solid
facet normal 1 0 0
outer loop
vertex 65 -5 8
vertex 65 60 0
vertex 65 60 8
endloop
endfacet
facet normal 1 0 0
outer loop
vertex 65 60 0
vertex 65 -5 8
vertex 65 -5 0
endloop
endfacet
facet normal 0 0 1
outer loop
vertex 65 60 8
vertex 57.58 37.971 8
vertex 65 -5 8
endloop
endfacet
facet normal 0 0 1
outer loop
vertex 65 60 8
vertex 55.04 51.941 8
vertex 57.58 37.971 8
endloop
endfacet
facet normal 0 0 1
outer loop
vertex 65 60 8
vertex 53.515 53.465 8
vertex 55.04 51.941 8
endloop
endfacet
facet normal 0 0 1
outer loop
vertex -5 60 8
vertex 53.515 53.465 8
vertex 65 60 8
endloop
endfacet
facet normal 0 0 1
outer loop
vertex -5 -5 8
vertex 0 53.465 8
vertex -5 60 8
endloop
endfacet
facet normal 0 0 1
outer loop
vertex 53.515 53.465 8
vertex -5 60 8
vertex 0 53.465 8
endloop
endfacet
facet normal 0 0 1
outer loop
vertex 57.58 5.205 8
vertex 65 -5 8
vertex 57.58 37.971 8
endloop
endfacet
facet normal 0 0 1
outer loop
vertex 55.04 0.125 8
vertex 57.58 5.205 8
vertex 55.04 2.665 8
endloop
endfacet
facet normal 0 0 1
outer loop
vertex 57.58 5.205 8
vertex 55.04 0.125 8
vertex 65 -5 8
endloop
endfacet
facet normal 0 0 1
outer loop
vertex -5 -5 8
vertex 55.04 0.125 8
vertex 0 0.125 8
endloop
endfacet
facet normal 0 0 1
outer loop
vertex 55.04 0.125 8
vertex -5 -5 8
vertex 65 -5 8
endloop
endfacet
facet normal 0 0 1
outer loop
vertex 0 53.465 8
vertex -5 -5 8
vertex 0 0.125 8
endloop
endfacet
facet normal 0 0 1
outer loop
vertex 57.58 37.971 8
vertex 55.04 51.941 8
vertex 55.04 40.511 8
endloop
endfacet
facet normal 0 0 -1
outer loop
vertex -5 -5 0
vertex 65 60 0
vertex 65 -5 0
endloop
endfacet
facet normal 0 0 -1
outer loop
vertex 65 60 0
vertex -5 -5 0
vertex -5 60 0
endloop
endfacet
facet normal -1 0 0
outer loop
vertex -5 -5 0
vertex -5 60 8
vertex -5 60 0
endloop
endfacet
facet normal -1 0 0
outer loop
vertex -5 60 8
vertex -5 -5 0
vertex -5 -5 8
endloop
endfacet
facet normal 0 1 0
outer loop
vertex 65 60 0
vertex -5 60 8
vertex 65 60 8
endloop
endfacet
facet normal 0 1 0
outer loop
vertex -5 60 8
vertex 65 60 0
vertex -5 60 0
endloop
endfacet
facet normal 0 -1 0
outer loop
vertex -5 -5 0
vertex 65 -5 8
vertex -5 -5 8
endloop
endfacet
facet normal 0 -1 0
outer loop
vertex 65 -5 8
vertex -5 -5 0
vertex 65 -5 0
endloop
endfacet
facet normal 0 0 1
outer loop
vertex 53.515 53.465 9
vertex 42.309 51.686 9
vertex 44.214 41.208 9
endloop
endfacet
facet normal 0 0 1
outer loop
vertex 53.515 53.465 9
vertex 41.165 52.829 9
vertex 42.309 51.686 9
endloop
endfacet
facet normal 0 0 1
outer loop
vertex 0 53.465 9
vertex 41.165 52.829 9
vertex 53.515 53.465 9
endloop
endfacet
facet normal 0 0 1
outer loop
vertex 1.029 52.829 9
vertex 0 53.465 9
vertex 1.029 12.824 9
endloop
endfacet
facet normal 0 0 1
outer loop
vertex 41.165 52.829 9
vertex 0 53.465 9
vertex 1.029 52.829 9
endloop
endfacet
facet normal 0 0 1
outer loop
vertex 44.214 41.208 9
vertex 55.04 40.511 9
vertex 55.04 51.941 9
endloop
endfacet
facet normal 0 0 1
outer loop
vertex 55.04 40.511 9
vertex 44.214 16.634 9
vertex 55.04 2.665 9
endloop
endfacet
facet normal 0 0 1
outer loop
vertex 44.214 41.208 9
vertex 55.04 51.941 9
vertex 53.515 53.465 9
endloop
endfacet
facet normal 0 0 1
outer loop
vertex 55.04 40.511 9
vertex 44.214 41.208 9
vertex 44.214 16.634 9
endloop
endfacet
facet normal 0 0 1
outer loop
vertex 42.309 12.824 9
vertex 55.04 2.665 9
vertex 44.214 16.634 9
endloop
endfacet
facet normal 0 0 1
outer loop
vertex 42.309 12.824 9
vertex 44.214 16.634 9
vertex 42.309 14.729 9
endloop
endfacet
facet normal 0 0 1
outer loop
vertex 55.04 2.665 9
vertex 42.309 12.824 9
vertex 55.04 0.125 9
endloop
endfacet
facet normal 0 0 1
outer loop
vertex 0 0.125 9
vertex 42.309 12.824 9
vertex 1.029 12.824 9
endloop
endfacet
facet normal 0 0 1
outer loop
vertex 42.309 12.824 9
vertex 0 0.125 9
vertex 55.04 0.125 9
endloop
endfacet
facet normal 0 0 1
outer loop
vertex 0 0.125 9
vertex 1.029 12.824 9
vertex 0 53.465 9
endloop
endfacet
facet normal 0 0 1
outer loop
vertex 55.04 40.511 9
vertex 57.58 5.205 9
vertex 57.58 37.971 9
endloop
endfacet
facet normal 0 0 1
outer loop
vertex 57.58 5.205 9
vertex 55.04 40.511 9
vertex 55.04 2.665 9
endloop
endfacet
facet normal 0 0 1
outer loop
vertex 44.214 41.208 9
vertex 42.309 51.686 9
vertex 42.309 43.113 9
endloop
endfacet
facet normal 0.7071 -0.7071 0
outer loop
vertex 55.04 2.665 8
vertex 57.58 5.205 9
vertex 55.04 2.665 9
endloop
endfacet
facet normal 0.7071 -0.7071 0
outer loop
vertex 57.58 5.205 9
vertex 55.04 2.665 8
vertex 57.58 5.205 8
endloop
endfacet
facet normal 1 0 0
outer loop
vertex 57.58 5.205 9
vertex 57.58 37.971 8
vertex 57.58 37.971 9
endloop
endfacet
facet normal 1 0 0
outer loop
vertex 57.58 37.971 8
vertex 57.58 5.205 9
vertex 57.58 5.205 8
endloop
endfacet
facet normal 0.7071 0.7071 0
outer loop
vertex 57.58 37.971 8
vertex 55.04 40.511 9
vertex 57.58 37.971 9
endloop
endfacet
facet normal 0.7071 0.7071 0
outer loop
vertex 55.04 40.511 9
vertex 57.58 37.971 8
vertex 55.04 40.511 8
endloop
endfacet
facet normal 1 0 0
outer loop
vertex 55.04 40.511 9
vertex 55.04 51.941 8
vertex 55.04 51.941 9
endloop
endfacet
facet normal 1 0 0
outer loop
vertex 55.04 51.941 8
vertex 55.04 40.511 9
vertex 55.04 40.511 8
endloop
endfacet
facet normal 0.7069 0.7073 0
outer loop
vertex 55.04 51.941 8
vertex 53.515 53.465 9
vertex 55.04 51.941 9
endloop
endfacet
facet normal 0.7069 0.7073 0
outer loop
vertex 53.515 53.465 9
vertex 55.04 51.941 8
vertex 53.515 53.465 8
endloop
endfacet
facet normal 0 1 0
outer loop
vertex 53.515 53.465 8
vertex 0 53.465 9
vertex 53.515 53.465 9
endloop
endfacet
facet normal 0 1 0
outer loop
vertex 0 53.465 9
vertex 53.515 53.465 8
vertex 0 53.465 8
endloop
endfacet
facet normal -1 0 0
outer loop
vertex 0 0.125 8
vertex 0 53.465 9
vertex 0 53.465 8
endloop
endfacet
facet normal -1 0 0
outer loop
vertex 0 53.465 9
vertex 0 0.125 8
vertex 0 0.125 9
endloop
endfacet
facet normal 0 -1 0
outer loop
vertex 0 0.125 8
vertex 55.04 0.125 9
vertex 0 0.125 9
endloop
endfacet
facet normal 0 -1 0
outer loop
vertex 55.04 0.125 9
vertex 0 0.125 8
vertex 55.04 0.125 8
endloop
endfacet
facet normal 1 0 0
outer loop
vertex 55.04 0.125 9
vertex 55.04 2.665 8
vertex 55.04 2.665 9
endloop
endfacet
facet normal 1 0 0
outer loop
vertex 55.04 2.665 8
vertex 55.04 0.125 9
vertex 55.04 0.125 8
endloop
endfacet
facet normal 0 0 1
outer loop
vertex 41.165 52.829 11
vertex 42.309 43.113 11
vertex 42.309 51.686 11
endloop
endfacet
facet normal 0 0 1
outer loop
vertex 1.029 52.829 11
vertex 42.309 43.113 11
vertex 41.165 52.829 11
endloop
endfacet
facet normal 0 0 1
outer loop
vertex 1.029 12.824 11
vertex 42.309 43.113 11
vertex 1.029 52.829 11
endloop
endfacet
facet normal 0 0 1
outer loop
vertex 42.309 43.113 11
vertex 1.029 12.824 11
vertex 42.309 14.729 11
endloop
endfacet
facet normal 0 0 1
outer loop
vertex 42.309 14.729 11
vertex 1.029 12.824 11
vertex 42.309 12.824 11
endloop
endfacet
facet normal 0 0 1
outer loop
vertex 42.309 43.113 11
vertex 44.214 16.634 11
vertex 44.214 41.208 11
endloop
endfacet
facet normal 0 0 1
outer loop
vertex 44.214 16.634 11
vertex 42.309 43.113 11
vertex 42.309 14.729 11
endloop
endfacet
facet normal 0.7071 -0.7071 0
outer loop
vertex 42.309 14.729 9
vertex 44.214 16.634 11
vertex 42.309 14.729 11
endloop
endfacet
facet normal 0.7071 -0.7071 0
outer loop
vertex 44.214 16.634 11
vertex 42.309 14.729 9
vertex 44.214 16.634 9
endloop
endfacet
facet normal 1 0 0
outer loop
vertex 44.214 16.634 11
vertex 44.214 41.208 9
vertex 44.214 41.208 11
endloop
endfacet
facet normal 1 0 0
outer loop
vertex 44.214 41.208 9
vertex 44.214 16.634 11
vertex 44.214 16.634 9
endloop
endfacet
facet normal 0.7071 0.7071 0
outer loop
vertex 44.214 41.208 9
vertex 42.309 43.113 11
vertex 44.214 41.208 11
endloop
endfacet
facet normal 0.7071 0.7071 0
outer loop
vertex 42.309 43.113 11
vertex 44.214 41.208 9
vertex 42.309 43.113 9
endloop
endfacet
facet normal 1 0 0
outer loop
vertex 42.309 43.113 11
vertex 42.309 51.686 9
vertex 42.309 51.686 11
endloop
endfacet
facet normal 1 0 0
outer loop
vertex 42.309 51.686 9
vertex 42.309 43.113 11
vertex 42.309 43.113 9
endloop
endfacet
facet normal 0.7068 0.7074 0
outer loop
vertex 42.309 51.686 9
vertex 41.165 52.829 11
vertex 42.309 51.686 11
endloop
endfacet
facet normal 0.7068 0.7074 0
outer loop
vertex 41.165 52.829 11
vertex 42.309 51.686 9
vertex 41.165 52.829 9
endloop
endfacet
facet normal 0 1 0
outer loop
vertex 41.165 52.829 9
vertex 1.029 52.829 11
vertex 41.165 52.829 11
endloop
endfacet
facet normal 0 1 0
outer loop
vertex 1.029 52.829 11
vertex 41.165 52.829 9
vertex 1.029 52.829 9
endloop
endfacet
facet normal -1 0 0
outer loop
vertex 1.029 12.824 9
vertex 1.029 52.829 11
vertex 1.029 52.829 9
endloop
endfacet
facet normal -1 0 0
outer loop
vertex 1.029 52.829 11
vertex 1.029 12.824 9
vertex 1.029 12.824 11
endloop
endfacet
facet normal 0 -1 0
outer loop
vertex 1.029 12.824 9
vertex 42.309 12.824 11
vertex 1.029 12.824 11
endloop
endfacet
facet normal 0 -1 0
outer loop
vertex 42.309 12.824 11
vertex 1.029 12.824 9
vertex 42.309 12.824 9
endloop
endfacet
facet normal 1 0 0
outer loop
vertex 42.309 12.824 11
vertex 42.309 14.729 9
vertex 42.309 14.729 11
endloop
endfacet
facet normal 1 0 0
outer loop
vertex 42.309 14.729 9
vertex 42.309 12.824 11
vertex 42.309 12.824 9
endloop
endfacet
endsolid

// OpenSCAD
/* arduino.scad
 *
 * Copyright (C) Jestin Stoffel 2012
 *
 * This library is free software; you can redistribute it and/or
 * modify it under the terms of the GNU Library General Public
 * License as published by the Free Software Foundation; either
 * version 2 of the License, or (at your option) any later version.
 *
 * This library is distributed in the hope that it will be useful,
 * but WITHOUT ANY WARRANTY; without even the implied warranty of
 * MERCHANTABILITY or FITNESS FOR A PARTICULAR PURPOSE.  See the GNU
 * Library General Public License for more details.
 *
 * You should have received a copy of the GNU Library General Public
 * License along with this library; if not, write to the Free
 * Software Foundation, Inc., 675 Mass Ave, Cambridge, MA 02139, USA.
 */

// Throughout this entire model, (0,0) is the top left mounting hole (nearest  the USB port)

// thickness of the PCB
board_height = 3;

// solid_holes - specifies if mounting holes should be added to or subtracted from the model
// combined_headers - specifies if space should be left between adjacent female headers, or if they should be rendered as a single header
// extend_ports - extends the USB and power ports by a centimeter, so that holes are more easily made when a model is used as a negative

module Board()
{
	color([0, 0.6, 0.8])
	linear_extrude(height = board_height, convexity = 10, twist = 0)
	{
		polygon( points = [ [-4.115, 2.545],
						[49.4, 2.545],
						[50.925, 1.021],
						[50.925, -10.409],
						[53.465, -12.949],
						[53.465, -45.715],
						[50.925, -48.255],
						[50.925, -50.795],
						[-4.115, -50.795] ],
				paths = [[0, 1, 2, 3, 4, 5, 6, 7, 8]],
				convexity = 10);
	}
}

module ArduinoMount() {
    union()
		{
         translate([-5,-5,0])
            cube([70,65,8]);
         translate([4.115, 53.465-2.545,6])
			Board();
         translate([4.115, 53.465-2.545,8])
         scale([0.75,0.75,1])
                Board();
		}
}

ArduinoMount();
